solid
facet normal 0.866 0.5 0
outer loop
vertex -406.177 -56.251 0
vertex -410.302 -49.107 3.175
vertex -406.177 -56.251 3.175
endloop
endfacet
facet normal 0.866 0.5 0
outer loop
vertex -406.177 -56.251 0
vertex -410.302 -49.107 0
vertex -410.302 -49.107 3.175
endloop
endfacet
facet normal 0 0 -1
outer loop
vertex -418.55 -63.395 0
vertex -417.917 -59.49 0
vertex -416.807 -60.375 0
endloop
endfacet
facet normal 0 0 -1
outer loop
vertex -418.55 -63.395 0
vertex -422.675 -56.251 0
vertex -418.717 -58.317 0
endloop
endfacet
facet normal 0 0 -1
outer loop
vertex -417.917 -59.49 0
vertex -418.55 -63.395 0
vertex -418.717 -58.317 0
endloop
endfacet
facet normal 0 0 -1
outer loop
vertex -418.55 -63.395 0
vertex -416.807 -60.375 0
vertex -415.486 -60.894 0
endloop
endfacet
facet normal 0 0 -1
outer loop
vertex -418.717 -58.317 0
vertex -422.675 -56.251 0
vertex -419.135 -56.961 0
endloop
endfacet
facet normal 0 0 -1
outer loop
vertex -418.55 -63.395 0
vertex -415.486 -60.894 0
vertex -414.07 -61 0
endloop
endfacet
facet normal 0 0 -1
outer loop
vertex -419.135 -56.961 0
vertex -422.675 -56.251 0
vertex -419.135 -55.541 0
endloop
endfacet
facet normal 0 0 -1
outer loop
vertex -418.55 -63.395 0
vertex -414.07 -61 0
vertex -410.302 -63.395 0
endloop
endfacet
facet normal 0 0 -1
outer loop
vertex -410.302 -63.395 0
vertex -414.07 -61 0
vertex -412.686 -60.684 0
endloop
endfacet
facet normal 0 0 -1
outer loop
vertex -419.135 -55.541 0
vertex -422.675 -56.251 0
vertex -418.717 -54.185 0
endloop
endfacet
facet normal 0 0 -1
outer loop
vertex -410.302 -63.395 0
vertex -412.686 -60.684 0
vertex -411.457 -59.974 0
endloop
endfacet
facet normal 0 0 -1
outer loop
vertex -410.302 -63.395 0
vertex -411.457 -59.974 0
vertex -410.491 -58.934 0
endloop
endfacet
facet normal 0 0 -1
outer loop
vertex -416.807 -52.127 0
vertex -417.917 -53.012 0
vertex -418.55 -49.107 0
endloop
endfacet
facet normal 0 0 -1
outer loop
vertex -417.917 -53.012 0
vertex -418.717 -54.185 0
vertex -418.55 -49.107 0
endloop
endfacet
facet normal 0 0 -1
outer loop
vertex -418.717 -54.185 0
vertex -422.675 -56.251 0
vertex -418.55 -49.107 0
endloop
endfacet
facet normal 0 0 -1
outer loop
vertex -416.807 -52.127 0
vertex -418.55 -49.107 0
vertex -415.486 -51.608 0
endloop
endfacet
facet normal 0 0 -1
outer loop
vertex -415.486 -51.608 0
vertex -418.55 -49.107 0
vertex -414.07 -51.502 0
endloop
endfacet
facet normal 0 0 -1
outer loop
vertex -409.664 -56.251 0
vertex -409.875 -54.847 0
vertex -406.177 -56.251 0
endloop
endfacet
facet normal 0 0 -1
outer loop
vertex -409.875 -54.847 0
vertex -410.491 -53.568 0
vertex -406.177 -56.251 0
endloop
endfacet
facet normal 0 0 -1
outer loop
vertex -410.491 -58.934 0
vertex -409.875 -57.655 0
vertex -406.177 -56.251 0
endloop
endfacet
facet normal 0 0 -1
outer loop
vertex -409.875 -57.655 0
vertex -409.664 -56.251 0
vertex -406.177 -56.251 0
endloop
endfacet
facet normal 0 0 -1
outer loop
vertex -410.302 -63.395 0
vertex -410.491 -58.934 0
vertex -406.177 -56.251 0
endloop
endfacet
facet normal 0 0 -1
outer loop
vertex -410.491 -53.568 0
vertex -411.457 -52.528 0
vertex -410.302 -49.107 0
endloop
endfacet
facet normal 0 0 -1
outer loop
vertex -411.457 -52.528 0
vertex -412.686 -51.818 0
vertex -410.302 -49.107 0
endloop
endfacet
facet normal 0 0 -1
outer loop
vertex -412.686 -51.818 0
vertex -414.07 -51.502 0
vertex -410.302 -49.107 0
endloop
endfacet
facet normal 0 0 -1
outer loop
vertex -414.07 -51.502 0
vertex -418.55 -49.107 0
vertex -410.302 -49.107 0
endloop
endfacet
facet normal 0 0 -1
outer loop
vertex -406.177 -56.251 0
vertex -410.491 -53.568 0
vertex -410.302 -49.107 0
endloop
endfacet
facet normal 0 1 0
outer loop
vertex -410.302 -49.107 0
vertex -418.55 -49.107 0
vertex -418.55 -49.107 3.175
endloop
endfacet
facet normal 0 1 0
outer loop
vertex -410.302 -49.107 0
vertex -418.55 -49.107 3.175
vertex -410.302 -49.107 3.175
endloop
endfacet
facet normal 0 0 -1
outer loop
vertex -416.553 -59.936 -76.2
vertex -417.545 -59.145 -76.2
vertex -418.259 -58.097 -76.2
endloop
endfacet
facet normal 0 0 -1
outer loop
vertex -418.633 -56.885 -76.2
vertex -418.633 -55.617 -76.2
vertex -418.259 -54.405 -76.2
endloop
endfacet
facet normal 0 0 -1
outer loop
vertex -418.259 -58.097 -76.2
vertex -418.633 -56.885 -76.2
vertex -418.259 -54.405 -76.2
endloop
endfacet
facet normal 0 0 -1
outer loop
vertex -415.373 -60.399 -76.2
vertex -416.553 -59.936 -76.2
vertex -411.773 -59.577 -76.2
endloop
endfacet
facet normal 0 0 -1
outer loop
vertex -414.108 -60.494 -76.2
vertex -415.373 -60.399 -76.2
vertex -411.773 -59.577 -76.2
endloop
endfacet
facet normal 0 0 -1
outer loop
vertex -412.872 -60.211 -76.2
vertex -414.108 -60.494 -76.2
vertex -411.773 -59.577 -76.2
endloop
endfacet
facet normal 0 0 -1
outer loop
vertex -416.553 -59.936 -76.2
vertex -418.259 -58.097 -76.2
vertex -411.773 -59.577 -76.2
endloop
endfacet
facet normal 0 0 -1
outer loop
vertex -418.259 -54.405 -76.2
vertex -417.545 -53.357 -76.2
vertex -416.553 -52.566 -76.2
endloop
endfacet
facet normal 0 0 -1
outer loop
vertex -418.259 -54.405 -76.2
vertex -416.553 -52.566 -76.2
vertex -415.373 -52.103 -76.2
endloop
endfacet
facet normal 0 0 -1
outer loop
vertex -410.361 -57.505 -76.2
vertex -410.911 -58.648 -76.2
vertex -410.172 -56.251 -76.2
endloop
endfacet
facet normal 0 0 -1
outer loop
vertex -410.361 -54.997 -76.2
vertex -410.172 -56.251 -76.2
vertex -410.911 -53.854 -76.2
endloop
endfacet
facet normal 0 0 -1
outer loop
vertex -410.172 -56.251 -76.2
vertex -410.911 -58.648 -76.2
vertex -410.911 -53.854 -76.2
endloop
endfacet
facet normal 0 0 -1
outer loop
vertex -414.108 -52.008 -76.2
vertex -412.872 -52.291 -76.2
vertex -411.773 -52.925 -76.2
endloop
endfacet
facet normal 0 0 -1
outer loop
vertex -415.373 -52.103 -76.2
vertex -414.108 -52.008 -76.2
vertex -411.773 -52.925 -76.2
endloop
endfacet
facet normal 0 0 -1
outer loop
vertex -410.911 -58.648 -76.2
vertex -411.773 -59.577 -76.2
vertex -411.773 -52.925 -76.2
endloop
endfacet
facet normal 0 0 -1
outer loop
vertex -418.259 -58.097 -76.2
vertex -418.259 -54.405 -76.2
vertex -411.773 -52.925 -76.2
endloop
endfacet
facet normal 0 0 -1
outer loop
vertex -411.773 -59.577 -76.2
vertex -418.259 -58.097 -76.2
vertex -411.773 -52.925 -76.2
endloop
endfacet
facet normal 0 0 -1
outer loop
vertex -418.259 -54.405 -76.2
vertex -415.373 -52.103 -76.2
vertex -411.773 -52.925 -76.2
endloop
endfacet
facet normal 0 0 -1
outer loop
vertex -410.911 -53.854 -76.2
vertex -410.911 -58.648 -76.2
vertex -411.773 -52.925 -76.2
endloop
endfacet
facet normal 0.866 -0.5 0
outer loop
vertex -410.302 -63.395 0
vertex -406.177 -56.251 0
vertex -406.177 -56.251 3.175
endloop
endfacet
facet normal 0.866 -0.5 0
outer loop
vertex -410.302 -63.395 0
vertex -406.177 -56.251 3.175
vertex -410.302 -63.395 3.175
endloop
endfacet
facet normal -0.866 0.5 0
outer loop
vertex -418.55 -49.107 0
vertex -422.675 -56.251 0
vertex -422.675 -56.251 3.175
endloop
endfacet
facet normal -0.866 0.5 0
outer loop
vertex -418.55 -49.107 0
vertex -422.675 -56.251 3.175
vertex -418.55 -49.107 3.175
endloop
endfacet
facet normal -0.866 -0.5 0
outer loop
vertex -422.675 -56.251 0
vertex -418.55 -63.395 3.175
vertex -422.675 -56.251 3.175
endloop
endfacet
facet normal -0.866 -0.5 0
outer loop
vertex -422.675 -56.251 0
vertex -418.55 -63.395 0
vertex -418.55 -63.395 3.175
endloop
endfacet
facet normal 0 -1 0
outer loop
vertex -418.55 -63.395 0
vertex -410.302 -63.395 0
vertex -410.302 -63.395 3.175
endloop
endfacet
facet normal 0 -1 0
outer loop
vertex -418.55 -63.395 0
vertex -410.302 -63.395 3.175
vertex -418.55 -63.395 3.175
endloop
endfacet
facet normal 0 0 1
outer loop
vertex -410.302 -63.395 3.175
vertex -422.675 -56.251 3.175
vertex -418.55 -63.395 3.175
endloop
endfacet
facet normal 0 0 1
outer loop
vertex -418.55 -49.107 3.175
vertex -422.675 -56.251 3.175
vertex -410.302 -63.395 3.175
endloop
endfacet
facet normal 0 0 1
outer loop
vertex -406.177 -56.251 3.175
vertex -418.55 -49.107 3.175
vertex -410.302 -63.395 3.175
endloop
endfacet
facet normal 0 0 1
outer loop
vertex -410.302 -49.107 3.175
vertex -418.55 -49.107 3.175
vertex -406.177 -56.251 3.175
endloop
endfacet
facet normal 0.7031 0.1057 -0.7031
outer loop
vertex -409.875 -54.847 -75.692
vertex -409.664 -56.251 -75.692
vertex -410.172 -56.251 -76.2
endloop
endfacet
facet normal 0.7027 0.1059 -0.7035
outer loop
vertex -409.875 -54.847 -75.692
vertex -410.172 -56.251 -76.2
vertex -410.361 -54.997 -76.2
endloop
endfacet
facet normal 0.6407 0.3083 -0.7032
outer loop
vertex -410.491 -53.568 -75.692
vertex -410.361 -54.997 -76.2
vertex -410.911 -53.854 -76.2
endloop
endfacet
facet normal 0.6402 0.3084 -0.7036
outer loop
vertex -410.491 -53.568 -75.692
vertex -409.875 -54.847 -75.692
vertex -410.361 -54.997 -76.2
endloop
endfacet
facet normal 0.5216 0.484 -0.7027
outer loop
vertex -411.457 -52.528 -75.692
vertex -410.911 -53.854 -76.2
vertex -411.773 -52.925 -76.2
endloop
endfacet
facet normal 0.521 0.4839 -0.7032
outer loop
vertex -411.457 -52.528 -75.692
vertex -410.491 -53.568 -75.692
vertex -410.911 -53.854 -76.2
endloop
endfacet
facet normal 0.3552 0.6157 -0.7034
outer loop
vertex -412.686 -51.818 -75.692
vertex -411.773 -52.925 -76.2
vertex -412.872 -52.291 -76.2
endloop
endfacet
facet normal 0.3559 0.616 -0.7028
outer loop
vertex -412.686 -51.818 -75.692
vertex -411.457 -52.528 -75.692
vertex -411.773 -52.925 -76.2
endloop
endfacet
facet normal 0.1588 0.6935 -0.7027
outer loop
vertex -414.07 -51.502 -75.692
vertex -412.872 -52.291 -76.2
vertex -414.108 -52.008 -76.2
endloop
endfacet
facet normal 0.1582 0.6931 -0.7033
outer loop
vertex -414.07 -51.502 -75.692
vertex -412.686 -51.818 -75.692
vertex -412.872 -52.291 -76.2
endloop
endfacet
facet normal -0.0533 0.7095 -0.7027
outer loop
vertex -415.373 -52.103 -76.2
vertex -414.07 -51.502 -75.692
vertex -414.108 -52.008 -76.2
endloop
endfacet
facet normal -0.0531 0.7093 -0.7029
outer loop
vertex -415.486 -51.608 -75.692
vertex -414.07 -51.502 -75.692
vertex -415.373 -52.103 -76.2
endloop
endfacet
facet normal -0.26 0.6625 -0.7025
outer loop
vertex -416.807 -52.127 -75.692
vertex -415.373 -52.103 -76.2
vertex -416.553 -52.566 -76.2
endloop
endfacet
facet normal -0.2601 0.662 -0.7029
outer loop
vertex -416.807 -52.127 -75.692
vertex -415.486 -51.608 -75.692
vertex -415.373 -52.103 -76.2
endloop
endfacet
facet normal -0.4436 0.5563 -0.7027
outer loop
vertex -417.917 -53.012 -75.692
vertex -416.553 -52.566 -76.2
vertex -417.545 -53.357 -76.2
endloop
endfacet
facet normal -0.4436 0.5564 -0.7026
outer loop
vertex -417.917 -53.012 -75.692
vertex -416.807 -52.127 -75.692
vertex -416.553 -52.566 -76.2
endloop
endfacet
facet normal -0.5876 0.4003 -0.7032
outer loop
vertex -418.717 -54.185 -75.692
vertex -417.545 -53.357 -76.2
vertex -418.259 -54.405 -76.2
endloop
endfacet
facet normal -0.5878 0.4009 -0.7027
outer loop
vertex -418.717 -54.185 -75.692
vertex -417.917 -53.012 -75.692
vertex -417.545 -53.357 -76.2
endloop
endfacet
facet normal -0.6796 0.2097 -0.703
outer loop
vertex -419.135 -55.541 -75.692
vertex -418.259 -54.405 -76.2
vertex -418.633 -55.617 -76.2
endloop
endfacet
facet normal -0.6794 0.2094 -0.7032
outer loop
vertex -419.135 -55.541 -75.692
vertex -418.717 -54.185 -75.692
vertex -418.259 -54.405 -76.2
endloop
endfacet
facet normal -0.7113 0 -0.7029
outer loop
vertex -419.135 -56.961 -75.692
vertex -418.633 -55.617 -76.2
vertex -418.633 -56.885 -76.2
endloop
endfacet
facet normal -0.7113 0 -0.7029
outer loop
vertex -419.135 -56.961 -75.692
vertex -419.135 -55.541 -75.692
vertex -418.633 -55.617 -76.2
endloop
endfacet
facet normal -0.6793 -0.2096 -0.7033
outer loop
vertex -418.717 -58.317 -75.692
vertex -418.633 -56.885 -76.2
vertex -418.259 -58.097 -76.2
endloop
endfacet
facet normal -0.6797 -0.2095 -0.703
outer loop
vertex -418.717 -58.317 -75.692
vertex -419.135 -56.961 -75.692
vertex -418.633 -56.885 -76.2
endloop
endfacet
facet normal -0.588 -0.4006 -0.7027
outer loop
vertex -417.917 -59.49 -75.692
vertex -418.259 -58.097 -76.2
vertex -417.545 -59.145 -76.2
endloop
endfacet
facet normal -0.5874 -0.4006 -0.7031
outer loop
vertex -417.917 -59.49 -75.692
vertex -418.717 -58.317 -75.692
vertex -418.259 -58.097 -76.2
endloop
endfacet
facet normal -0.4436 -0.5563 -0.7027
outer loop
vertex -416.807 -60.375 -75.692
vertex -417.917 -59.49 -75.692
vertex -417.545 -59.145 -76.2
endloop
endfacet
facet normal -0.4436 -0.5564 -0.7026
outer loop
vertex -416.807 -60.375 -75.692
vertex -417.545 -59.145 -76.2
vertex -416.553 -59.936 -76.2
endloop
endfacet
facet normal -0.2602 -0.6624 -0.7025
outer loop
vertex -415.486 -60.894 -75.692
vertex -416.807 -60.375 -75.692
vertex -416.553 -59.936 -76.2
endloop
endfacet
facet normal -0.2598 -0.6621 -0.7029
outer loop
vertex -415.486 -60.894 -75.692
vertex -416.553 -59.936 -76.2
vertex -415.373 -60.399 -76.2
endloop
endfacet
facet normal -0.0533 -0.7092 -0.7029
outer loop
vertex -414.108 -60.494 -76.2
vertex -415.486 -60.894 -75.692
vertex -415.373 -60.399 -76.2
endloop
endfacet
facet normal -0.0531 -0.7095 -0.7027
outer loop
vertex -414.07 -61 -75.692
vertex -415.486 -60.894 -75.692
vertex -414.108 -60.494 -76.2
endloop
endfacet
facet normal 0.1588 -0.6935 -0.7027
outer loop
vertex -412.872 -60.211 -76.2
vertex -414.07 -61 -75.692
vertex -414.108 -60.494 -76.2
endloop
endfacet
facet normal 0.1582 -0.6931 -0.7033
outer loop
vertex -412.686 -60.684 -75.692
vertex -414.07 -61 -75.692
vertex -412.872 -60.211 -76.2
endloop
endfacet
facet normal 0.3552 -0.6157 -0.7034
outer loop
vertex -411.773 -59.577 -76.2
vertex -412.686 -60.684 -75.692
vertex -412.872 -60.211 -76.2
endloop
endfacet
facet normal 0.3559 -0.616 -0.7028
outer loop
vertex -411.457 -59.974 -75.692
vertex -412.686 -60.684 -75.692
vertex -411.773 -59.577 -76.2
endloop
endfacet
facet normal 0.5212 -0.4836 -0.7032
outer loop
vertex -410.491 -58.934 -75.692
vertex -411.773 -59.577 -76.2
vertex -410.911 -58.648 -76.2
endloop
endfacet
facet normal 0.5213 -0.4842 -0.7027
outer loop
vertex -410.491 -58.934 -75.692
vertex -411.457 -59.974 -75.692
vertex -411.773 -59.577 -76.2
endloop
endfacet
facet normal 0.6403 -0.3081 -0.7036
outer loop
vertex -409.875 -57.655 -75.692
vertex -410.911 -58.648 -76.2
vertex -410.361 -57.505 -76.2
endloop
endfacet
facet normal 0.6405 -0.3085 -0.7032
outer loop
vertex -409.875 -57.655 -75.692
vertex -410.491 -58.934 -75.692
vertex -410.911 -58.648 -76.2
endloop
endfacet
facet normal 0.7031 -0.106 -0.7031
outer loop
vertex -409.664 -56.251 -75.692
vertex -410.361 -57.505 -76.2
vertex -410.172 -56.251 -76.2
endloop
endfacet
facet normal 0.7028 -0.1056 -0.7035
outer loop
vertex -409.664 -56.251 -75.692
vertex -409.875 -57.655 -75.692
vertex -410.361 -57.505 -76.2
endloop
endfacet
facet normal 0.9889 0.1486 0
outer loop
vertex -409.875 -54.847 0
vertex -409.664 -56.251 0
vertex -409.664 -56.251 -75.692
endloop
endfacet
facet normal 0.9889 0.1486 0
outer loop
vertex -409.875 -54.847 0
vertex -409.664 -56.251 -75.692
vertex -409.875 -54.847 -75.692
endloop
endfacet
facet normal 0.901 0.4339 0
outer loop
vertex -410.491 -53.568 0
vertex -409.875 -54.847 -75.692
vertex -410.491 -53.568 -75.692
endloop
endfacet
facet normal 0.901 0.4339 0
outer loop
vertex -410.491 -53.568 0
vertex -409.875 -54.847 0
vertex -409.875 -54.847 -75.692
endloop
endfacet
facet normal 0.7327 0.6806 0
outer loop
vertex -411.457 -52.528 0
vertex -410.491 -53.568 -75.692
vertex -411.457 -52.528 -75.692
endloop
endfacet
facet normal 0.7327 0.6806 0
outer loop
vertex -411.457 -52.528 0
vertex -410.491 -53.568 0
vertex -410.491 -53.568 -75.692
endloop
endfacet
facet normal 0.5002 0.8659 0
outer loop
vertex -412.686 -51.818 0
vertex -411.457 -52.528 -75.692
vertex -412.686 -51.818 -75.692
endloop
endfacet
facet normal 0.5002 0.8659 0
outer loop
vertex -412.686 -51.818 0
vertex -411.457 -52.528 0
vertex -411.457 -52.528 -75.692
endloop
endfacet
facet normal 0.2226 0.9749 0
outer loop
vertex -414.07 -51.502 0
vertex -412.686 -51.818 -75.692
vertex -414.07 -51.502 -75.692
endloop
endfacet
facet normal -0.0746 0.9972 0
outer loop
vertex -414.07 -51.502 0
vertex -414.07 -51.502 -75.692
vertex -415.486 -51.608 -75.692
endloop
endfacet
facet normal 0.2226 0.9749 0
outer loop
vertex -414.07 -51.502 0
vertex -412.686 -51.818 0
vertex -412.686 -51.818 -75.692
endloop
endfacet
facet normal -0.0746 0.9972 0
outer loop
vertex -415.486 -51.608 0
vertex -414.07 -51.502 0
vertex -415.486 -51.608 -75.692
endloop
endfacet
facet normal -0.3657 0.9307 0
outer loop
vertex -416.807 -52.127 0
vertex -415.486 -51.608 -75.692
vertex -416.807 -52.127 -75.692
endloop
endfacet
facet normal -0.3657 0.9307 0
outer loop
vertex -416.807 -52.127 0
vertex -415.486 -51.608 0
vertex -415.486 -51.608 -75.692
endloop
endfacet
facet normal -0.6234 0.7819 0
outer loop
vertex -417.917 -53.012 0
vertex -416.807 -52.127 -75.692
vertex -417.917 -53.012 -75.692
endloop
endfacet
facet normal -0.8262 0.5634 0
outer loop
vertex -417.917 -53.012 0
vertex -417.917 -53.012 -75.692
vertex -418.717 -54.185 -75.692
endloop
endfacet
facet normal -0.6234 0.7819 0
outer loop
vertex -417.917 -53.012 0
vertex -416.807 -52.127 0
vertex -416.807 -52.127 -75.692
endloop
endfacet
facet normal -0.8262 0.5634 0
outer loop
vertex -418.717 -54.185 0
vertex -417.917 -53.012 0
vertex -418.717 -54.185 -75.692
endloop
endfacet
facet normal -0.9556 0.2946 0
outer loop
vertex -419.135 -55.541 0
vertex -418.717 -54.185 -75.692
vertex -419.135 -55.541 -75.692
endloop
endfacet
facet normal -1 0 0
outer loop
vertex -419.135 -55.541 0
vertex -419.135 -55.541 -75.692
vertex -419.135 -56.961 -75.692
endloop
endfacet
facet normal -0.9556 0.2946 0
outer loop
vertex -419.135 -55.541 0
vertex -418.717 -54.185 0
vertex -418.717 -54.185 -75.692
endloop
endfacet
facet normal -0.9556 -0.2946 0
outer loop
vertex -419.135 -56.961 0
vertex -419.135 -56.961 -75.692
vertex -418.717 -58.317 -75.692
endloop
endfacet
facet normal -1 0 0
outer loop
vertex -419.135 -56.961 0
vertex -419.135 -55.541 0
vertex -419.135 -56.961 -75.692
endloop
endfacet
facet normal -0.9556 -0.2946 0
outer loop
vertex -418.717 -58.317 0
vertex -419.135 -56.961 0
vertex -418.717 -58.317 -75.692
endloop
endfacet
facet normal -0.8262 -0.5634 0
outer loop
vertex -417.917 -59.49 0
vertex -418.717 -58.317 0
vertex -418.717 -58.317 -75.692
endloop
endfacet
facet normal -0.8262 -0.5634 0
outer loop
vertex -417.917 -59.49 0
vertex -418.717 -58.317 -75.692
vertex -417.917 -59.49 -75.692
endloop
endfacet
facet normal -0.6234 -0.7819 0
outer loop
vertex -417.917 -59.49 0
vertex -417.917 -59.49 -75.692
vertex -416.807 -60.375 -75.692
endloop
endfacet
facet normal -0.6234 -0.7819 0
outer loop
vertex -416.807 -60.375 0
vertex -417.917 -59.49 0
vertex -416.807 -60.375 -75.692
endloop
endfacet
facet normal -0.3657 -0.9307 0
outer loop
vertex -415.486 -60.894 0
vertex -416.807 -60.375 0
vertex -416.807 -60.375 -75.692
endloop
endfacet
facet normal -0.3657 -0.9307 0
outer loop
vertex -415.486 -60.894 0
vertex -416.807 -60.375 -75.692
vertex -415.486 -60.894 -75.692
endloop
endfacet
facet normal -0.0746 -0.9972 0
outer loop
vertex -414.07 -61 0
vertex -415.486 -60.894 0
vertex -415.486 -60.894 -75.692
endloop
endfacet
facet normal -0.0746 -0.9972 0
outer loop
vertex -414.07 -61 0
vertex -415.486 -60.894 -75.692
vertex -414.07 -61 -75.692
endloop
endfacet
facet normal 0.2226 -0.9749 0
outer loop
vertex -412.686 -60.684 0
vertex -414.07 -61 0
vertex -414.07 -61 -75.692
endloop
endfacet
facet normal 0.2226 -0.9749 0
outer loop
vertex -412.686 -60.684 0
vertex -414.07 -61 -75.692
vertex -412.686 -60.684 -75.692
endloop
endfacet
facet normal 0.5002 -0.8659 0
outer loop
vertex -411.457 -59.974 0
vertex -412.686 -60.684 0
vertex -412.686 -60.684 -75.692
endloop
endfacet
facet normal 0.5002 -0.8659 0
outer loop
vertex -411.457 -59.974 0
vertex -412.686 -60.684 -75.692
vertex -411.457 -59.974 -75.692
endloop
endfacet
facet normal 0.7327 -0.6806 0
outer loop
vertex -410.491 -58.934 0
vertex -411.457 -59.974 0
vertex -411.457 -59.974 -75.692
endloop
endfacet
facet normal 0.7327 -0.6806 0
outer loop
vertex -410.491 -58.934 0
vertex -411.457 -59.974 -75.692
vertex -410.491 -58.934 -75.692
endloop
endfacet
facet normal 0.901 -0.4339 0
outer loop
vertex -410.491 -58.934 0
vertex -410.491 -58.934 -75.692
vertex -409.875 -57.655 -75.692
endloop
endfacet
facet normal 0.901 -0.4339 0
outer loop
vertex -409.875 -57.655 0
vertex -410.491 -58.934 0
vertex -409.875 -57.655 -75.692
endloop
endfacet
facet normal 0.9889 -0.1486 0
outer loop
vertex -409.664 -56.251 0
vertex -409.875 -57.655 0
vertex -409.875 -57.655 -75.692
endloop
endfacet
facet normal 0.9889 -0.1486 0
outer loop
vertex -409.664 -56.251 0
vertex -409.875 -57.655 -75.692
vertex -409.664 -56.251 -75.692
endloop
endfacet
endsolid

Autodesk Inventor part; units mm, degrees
ref_plane "YZ Plane" through (0, 0, 0) normal (1, 0, 0) x (0, 1, 0)
ref_plane "XZ Plane" through (0, 0, 0) normal (0, 1, 0) x (-1, 0, 0)
ref_plane "XY Plane" through (0, 0, 0) normal (0, 0, 1) x (1, 0, 0)
sketch "Sketch1" plane through (0, 0, 0) normal (0, 0, 1) x (1, 0, 0)
  circle A0 centre (-414.4261, -56.251) radius 4.7625
  point P0 (0, 0)
  dimension "d0" = 9.525
extrude "Extrusion1" add sketch "Sketch1" against normal blind 76.2
sketch "Sketch2" plane through (-414.4261, -56.251, 0) normal (0, 0, 1) x (1, 0, 0)
  circle A0 centre (0, 0) radius 4.7625 projected
  line L0 (-8.2489, 0) -> (-4.1244, 7.1437)
  line L1 (-4.1244, 7.1437) -> (4.1244, 7.1438)
  line L2 (4.1244, 7.1438) -> (8.2489, 0)
  line L3 (8.2489, 0) -> (4.1244, -7.1437)
  line L4 (4.1244, -7.1437) -> (-4.1244, -7.1438)
  line L5 (-4.1244, -7.1438) -> (-8.2489, 0)
  point P0 (414.4261, 56.251)
  dimension "d3" = 14.2875
extrude "Extrusion2" add sketch "Sketch2" along normal blind 3.175 contours A0 | L0 L1 L2 L3 L4 L5
thread "Thread1" size "3/8-16 UNC" class "2A" standard "ANSI Unified Screw Threads" length 25.4
chamfer "Chamfer1" distance 0.508 angle 45 1 edges at (-419.1886, -56.251, -76.2)
properties part number "375 bolt x4" material "Steel"
